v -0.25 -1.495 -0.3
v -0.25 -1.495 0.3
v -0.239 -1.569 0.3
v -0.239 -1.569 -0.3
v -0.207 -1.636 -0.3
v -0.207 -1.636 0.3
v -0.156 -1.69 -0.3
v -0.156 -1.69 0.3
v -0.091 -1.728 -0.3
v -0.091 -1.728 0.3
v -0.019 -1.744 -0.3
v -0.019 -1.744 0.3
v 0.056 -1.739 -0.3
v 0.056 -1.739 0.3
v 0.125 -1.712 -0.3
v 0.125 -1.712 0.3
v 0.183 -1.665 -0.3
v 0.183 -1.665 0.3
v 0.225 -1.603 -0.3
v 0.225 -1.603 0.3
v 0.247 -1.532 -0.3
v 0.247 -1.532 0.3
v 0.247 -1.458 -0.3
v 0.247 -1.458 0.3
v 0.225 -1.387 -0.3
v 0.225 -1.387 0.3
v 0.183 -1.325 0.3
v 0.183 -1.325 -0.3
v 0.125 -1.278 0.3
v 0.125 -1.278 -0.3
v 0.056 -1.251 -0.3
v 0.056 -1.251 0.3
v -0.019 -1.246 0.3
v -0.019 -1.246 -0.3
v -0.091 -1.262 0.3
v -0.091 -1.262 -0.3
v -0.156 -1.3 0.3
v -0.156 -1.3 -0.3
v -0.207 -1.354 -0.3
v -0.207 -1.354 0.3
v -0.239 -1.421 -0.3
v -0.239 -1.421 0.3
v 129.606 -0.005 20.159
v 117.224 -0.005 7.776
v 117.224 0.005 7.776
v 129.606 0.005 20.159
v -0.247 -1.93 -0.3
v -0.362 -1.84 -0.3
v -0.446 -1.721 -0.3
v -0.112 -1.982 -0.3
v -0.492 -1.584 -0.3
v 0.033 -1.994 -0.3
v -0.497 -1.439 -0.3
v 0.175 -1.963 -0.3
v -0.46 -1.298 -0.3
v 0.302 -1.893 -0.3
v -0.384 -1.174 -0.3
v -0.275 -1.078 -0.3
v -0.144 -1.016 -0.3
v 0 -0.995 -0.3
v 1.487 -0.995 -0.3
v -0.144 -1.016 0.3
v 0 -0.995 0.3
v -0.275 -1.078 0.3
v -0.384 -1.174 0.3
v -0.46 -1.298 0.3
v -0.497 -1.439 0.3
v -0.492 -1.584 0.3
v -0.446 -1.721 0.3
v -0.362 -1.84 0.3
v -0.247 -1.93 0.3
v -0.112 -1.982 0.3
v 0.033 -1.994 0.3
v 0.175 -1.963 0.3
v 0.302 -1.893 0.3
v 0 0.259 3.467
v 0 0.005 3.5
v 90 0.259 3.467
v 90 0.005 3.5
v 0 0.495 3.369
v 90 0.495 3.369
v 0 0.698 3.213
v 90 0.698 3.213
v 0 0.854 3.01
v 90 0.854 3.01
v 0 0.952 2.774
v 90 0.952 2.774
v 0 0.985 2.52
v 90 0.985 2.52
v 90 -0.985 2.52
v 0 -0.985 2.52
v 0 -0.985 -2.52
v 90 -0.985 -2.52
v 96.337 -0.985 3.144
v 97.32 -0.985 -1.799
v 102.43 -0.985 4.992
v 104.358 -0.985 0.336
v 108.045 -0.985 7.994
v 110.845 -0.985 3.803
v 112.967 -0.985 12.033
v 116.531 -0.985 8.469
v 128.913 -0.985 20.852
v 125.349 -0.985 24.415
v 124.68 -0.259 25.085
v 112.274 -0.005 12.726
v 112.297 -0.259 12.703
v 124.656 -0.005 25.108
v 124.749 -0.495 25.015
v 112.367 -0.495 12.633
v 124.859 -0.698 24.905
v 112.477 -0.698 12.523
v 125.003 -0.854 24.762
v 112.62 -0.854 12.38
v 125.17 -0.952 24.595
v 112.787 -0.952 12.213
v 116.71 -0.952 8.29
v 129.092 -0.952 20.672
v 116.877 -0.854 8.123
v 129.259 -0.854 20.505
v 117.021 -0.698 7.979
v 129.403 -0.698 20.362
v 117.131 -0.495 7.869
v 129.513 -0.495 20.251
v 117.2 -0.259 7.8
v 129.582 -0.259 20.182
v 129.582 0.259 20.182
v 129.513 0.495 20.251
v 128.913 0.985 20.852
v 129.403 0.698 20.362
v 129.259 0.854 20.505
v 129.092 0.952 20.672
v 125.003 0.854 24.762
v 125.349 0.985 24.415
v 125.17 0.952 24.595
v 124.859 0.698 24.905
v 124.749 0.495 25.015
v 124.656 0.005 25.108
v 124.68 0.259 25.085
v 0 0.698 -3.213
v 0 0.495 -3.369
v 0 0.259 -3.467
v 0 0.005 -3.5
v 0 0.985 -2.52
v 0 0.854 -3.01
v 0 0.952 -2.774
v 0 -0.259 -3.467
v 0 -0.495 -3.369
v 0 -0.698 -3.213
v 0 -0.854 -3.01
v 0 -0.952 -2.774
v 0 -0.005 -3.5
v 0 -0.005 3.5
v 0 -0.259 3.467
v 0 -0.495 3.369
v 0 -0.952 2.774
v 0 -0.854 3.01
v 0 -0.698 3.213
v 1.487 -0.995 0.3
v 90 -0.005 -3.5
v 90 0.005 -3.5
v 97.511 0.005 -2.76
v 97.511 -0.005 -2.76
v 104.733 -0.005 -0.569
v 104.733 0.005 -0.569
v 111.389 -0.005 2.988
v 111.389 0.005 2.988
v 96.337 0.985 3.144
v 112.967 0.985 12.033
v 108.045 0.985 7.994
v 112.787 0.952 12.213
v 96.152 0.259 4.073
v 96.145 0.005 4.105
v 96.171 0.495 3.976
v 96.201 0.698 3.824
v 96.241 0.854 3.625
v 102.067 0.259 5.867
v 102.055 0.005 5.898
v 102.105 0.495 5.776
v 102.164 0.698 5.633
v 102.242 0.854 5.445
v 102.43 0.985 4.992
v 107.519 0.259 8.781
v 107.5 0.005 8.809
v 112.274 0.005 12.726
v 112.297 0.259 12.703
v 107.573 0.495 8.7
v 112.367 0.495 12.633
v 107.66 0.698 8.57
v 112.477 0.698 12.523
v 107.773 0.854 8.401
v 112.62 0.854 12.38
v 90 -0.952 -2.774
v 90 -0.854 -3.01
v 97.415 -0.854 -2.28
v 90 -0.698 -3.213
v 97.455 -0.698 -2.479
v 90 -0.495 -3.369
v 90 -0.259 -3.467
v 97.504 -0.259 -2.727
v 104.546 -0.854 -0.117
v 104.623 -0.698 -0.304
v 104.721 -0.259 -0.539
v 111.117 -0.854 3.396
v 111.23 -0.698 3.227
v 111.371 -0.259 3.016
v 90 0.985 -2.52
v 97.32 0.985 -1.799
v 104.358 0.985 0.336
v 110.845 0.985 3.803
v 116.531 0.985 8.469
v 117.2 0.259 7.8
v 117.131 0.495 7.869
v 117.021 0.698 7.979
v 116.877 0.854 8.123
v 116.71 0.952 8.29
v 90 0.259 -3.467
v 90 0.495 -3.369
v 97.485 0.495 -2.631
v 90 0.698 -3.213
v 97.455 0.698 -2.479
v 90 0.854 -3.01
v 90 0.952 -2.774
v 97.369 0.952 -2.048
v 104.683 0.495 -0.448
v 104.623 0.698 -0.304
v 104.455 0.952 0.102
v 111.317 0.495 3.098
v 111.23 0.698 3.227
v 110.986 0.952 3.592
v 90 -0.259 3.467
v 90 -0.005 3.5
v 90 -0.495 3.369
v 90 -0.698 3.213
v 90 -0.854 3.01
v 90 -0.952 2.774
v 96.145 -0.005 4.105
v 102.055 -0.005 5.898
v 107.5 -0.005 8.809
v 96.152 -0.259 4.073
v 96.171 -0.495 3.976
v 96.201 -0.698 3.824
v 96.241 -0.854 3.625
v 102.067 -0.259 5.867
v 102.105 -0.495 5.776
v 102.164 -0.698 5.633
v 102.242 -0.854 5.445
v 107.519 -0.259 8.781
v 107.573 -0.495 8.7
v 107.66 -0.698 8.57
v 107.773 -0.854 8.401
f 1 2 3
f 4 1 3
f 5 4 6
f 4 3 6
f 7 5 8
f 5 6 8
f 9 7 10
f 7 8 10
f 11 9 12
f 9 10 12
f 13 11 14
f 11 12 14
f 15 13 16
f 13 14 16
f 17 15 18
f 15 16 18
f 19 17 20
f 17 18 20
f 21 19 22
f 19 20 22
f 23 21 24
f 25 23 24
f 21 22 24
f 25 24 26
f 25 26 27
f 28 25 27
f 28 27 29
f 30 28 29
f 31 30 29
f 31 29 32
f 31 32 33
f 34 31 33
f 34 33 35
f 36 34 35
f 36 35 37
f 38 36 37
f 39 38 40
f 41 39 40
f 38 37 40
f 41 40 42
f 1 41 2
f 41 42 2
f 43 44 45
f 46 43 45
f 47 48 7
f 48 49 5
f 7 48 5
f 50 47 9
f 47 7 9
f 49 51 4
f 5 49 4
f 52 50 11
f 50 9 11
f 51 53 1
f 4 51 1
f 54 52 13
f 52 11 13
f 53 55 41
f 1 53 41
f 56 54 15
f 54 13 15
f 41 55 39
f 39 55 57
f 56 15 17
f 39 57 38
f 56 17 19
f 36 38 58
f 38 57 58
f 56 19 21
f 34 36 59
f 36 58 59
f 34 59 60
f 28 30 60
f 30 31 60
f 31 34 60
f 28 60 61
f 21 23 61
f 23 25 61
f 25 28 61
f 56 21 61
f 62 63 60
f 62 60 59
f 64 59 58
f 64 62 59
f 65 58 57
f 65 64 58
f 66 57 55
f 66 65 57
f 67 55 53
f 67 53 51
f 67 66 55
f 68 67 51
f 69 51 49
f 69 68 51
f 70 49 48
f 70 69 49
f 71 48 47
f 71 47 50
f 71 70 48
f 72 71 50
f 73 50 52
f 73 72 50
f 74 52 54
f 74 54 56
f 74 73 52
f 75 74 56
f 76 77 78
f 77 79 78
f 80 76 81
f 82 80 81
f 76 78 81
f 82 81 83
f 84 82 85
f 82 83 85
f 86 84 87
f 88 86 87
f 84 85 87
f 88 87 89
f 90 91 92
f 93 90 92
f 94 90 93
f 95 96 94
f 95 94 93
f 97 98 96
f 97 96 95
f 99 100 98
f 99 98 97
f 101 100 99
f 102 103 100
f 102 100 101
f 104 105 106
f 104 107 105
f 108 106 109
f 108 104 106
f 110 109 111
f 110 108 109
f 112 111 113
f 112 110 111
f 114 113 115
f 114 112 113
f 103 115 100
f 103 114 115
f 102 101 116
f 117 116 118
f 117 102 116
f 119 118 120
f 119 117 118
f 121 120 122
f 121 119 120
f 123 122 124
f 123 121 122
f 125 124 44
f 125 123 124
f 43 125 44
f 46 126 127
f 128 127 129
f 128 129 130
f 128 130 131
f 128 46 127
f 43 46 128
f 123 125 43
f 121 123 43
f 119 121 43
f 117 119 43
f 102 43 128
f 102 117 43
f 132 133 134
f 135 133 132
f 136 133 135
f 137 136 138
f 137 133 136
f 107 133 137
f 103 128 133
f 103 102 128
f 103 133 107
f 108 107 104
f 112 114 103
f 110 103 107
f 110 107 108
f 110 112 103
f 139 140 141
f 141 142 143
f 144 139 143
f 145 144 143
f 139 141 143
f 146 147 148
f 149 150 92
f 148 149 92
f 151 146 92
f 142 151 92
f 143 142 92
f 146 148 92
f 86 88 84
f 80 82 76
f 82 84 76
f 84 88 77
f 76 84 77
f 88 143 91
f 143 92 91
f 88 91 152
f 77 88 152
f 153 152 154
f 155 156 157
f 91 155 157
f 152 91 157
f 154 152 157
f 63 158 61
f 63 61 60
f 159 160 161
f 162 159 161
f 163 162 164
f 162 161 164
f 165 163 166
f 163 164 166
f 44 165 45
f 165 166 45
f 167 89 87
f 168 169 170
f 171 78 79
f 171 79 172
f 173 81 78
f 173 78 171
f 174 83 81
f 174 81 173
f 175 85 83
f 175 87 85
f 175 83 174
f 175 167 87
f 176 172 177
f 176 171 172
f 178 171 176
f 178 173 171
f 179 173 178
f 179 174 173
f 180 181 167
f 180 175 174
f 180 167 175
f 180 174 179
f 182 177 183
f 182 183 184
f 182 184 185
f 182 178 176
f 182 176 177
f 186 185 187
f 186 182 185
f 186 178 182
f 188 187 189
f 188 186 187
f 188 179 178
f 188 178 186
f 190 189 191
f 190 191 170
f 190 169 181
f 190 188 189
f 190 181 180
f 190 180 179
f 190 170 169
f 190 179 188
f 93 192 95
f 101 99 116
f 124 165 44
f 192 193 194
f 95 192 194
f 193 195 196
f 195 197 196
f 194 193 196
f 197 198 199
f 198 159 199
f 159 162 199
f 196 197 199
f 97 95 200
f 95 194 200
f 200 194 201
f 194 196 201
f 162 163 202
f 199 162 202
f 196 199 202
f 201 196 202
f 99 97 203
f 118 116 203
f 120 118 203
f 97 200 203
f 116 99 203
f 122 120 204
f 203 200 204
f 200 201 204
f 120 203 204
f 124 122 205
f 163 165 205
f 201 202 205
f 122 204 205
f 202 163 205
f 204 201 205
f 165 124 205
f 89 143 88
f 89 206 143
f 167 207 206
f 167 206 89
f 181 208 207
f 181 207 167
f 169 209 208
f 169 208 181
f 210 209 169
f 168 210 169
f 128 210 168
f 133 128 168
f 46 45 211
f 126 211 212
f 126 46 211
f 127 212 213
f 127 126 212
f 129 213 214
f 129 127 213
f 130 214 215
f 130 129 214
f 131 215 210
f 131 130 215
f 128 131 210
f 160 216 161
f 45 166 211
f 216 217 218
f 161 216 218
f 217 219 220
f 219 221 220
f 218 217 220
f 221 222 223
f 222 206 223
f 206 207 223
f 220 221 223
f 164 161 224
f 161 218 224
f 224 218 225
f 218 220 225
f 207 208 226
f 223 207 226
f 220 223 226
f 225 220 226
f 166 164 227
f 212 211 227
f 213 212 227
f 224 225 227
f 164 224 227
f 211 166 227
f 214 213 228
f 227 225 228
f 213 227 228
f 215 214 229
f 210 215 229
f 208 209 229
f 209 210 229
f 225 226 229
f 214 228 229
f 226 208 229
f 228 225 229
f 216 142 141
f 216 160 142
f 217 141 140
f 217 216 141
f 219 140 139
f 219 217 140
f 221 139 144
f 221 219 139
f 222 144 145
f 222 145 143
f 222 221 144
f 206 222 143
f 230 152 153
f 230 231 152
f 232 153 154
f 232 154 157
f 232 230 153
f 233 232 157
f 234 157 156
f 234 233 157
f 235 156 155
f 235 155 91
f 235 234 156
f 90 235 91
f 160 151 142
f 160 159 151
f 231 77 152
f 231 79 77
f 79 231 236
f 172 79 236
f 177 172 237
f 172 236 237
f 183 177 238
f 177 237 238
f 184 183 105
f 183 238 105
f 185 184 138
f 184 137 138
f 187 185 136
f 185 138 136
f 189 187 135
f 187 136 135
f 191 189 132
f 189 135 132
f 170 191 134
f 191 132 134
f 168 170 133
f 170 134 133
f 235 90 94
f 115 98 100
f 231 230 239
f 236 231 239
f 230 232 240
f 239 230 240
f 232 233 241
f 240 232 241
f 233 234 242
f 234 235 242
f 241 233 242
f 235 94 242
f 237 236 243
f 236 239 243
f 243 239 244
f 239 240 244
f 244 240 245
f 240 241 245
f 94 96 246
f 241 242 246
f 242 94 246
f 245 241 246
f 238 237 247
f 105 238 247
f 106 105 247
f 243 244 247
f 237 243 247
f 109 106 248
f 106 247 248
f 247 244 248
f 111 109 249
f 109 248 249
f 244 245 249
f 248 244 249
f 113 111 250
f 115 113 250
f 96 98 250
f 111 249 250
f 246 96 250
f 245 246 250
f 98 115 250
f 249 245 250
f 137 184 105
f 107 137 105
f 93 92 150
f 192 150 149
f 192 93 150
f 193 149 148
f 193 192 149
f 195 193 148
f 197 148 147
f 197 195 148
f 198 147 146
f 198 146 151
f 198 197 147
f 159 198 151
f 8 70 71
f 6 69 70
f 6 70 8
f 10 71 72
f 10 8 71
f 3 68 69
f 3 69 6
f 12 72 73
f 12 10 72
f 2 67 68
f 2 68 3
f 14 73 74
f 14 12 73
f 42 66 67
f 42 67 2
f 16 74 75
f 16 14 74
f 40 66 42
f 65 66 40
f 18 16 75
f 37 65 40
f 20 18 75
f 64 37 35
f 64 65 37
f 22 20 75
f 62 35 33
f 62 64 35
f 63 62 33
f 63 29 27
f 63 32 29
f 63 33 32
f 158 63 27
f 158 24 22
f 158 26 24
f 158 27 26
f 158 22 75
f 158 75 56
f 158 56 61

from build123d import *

# Parameters (mm, degrees)
SKETCH3_W           = 7
SKETCH3_H           = 1.97
FILLET1_R           = 0.98
SKETCH7_R           = 0.25
BOSS_EXTRUDE1_DEPTH = 0.6


with BuildPart() as part:
    # Sweep1: sweep along a path in Sketch1
    with BuildLine(Plane(origin=(0, 0, 0), x_dir=(1, 0, 0), z_dir=(0, 1, 0))) as sweep1_path:
        Line((0, 0), (90, 0))
        ThreePointArc((90, 0), (103.393920133, -2.664216362), (114.748737342, -10.251262658))
        Line((114.748737342, -10.251262658), (127.13092964, -22.633454957))
    # Sketch3 → Sweep1 (sweep)
    with BuildSketch(Plane(origin=(0, 0, 0), x_dir=(0, 0, -1), z_dir=(1, 0, 0))):
        Rectangle(SKETCH3_W, SKETCH3_H)
    sweep(path=sweep1_path.line)

    # Fillet1
    fillet1_edges = [part.edges().sort_by_distance(p)[0] for p in [
        (45, -0.985, -3.5),
        (45, 0.985, -3.5),
        (45, 0.985, 3.5),
        (45, -0.985, 3.5),
        (104.733312146, -0.985, -0.569362002),
        (104.733312146, 0.985, -0.569362002),
        (102.05452812, 0.985, 5.897794726),
        (102.05452812, -0.985, 5.897794726),
        (123.414707225, -0.985, 13.967485074),
        (123.414707225, 0.985, 13.967485074),
        (118.464959757, 0.985, 18.917232542),
        (118.464959757, -0.985, 18.917232542),
    ]]
    fillet(fillet1_edges, radius=FILLET1_R)


with BuildPart() as body_2:
    # Sketch7 → Boss-Extrude1 (new body)
    with BuildSketch(Plane.XY.offset(0.3)):
        with BuildLine():
            Line((1.487306111, -0.995), (0, -0.995))
            ThreePointArc((0, -0.995), (-0.473935601, -1.654326852), (0.30204267, -1.893459817))
            Line((0.30204267, -1.893459817), (1.487306111, -0.995))
        make_face()
        with Locations(Location((0, -1.495, 0), (0, 0, 180))):
            Circle(SKETCH7_R, mode=Mode.SUBTRACT)
    extrude(amount=-BOSS_EXTRUDE1_DEPTH)


solid = Compound([part.part, body_2.part])
